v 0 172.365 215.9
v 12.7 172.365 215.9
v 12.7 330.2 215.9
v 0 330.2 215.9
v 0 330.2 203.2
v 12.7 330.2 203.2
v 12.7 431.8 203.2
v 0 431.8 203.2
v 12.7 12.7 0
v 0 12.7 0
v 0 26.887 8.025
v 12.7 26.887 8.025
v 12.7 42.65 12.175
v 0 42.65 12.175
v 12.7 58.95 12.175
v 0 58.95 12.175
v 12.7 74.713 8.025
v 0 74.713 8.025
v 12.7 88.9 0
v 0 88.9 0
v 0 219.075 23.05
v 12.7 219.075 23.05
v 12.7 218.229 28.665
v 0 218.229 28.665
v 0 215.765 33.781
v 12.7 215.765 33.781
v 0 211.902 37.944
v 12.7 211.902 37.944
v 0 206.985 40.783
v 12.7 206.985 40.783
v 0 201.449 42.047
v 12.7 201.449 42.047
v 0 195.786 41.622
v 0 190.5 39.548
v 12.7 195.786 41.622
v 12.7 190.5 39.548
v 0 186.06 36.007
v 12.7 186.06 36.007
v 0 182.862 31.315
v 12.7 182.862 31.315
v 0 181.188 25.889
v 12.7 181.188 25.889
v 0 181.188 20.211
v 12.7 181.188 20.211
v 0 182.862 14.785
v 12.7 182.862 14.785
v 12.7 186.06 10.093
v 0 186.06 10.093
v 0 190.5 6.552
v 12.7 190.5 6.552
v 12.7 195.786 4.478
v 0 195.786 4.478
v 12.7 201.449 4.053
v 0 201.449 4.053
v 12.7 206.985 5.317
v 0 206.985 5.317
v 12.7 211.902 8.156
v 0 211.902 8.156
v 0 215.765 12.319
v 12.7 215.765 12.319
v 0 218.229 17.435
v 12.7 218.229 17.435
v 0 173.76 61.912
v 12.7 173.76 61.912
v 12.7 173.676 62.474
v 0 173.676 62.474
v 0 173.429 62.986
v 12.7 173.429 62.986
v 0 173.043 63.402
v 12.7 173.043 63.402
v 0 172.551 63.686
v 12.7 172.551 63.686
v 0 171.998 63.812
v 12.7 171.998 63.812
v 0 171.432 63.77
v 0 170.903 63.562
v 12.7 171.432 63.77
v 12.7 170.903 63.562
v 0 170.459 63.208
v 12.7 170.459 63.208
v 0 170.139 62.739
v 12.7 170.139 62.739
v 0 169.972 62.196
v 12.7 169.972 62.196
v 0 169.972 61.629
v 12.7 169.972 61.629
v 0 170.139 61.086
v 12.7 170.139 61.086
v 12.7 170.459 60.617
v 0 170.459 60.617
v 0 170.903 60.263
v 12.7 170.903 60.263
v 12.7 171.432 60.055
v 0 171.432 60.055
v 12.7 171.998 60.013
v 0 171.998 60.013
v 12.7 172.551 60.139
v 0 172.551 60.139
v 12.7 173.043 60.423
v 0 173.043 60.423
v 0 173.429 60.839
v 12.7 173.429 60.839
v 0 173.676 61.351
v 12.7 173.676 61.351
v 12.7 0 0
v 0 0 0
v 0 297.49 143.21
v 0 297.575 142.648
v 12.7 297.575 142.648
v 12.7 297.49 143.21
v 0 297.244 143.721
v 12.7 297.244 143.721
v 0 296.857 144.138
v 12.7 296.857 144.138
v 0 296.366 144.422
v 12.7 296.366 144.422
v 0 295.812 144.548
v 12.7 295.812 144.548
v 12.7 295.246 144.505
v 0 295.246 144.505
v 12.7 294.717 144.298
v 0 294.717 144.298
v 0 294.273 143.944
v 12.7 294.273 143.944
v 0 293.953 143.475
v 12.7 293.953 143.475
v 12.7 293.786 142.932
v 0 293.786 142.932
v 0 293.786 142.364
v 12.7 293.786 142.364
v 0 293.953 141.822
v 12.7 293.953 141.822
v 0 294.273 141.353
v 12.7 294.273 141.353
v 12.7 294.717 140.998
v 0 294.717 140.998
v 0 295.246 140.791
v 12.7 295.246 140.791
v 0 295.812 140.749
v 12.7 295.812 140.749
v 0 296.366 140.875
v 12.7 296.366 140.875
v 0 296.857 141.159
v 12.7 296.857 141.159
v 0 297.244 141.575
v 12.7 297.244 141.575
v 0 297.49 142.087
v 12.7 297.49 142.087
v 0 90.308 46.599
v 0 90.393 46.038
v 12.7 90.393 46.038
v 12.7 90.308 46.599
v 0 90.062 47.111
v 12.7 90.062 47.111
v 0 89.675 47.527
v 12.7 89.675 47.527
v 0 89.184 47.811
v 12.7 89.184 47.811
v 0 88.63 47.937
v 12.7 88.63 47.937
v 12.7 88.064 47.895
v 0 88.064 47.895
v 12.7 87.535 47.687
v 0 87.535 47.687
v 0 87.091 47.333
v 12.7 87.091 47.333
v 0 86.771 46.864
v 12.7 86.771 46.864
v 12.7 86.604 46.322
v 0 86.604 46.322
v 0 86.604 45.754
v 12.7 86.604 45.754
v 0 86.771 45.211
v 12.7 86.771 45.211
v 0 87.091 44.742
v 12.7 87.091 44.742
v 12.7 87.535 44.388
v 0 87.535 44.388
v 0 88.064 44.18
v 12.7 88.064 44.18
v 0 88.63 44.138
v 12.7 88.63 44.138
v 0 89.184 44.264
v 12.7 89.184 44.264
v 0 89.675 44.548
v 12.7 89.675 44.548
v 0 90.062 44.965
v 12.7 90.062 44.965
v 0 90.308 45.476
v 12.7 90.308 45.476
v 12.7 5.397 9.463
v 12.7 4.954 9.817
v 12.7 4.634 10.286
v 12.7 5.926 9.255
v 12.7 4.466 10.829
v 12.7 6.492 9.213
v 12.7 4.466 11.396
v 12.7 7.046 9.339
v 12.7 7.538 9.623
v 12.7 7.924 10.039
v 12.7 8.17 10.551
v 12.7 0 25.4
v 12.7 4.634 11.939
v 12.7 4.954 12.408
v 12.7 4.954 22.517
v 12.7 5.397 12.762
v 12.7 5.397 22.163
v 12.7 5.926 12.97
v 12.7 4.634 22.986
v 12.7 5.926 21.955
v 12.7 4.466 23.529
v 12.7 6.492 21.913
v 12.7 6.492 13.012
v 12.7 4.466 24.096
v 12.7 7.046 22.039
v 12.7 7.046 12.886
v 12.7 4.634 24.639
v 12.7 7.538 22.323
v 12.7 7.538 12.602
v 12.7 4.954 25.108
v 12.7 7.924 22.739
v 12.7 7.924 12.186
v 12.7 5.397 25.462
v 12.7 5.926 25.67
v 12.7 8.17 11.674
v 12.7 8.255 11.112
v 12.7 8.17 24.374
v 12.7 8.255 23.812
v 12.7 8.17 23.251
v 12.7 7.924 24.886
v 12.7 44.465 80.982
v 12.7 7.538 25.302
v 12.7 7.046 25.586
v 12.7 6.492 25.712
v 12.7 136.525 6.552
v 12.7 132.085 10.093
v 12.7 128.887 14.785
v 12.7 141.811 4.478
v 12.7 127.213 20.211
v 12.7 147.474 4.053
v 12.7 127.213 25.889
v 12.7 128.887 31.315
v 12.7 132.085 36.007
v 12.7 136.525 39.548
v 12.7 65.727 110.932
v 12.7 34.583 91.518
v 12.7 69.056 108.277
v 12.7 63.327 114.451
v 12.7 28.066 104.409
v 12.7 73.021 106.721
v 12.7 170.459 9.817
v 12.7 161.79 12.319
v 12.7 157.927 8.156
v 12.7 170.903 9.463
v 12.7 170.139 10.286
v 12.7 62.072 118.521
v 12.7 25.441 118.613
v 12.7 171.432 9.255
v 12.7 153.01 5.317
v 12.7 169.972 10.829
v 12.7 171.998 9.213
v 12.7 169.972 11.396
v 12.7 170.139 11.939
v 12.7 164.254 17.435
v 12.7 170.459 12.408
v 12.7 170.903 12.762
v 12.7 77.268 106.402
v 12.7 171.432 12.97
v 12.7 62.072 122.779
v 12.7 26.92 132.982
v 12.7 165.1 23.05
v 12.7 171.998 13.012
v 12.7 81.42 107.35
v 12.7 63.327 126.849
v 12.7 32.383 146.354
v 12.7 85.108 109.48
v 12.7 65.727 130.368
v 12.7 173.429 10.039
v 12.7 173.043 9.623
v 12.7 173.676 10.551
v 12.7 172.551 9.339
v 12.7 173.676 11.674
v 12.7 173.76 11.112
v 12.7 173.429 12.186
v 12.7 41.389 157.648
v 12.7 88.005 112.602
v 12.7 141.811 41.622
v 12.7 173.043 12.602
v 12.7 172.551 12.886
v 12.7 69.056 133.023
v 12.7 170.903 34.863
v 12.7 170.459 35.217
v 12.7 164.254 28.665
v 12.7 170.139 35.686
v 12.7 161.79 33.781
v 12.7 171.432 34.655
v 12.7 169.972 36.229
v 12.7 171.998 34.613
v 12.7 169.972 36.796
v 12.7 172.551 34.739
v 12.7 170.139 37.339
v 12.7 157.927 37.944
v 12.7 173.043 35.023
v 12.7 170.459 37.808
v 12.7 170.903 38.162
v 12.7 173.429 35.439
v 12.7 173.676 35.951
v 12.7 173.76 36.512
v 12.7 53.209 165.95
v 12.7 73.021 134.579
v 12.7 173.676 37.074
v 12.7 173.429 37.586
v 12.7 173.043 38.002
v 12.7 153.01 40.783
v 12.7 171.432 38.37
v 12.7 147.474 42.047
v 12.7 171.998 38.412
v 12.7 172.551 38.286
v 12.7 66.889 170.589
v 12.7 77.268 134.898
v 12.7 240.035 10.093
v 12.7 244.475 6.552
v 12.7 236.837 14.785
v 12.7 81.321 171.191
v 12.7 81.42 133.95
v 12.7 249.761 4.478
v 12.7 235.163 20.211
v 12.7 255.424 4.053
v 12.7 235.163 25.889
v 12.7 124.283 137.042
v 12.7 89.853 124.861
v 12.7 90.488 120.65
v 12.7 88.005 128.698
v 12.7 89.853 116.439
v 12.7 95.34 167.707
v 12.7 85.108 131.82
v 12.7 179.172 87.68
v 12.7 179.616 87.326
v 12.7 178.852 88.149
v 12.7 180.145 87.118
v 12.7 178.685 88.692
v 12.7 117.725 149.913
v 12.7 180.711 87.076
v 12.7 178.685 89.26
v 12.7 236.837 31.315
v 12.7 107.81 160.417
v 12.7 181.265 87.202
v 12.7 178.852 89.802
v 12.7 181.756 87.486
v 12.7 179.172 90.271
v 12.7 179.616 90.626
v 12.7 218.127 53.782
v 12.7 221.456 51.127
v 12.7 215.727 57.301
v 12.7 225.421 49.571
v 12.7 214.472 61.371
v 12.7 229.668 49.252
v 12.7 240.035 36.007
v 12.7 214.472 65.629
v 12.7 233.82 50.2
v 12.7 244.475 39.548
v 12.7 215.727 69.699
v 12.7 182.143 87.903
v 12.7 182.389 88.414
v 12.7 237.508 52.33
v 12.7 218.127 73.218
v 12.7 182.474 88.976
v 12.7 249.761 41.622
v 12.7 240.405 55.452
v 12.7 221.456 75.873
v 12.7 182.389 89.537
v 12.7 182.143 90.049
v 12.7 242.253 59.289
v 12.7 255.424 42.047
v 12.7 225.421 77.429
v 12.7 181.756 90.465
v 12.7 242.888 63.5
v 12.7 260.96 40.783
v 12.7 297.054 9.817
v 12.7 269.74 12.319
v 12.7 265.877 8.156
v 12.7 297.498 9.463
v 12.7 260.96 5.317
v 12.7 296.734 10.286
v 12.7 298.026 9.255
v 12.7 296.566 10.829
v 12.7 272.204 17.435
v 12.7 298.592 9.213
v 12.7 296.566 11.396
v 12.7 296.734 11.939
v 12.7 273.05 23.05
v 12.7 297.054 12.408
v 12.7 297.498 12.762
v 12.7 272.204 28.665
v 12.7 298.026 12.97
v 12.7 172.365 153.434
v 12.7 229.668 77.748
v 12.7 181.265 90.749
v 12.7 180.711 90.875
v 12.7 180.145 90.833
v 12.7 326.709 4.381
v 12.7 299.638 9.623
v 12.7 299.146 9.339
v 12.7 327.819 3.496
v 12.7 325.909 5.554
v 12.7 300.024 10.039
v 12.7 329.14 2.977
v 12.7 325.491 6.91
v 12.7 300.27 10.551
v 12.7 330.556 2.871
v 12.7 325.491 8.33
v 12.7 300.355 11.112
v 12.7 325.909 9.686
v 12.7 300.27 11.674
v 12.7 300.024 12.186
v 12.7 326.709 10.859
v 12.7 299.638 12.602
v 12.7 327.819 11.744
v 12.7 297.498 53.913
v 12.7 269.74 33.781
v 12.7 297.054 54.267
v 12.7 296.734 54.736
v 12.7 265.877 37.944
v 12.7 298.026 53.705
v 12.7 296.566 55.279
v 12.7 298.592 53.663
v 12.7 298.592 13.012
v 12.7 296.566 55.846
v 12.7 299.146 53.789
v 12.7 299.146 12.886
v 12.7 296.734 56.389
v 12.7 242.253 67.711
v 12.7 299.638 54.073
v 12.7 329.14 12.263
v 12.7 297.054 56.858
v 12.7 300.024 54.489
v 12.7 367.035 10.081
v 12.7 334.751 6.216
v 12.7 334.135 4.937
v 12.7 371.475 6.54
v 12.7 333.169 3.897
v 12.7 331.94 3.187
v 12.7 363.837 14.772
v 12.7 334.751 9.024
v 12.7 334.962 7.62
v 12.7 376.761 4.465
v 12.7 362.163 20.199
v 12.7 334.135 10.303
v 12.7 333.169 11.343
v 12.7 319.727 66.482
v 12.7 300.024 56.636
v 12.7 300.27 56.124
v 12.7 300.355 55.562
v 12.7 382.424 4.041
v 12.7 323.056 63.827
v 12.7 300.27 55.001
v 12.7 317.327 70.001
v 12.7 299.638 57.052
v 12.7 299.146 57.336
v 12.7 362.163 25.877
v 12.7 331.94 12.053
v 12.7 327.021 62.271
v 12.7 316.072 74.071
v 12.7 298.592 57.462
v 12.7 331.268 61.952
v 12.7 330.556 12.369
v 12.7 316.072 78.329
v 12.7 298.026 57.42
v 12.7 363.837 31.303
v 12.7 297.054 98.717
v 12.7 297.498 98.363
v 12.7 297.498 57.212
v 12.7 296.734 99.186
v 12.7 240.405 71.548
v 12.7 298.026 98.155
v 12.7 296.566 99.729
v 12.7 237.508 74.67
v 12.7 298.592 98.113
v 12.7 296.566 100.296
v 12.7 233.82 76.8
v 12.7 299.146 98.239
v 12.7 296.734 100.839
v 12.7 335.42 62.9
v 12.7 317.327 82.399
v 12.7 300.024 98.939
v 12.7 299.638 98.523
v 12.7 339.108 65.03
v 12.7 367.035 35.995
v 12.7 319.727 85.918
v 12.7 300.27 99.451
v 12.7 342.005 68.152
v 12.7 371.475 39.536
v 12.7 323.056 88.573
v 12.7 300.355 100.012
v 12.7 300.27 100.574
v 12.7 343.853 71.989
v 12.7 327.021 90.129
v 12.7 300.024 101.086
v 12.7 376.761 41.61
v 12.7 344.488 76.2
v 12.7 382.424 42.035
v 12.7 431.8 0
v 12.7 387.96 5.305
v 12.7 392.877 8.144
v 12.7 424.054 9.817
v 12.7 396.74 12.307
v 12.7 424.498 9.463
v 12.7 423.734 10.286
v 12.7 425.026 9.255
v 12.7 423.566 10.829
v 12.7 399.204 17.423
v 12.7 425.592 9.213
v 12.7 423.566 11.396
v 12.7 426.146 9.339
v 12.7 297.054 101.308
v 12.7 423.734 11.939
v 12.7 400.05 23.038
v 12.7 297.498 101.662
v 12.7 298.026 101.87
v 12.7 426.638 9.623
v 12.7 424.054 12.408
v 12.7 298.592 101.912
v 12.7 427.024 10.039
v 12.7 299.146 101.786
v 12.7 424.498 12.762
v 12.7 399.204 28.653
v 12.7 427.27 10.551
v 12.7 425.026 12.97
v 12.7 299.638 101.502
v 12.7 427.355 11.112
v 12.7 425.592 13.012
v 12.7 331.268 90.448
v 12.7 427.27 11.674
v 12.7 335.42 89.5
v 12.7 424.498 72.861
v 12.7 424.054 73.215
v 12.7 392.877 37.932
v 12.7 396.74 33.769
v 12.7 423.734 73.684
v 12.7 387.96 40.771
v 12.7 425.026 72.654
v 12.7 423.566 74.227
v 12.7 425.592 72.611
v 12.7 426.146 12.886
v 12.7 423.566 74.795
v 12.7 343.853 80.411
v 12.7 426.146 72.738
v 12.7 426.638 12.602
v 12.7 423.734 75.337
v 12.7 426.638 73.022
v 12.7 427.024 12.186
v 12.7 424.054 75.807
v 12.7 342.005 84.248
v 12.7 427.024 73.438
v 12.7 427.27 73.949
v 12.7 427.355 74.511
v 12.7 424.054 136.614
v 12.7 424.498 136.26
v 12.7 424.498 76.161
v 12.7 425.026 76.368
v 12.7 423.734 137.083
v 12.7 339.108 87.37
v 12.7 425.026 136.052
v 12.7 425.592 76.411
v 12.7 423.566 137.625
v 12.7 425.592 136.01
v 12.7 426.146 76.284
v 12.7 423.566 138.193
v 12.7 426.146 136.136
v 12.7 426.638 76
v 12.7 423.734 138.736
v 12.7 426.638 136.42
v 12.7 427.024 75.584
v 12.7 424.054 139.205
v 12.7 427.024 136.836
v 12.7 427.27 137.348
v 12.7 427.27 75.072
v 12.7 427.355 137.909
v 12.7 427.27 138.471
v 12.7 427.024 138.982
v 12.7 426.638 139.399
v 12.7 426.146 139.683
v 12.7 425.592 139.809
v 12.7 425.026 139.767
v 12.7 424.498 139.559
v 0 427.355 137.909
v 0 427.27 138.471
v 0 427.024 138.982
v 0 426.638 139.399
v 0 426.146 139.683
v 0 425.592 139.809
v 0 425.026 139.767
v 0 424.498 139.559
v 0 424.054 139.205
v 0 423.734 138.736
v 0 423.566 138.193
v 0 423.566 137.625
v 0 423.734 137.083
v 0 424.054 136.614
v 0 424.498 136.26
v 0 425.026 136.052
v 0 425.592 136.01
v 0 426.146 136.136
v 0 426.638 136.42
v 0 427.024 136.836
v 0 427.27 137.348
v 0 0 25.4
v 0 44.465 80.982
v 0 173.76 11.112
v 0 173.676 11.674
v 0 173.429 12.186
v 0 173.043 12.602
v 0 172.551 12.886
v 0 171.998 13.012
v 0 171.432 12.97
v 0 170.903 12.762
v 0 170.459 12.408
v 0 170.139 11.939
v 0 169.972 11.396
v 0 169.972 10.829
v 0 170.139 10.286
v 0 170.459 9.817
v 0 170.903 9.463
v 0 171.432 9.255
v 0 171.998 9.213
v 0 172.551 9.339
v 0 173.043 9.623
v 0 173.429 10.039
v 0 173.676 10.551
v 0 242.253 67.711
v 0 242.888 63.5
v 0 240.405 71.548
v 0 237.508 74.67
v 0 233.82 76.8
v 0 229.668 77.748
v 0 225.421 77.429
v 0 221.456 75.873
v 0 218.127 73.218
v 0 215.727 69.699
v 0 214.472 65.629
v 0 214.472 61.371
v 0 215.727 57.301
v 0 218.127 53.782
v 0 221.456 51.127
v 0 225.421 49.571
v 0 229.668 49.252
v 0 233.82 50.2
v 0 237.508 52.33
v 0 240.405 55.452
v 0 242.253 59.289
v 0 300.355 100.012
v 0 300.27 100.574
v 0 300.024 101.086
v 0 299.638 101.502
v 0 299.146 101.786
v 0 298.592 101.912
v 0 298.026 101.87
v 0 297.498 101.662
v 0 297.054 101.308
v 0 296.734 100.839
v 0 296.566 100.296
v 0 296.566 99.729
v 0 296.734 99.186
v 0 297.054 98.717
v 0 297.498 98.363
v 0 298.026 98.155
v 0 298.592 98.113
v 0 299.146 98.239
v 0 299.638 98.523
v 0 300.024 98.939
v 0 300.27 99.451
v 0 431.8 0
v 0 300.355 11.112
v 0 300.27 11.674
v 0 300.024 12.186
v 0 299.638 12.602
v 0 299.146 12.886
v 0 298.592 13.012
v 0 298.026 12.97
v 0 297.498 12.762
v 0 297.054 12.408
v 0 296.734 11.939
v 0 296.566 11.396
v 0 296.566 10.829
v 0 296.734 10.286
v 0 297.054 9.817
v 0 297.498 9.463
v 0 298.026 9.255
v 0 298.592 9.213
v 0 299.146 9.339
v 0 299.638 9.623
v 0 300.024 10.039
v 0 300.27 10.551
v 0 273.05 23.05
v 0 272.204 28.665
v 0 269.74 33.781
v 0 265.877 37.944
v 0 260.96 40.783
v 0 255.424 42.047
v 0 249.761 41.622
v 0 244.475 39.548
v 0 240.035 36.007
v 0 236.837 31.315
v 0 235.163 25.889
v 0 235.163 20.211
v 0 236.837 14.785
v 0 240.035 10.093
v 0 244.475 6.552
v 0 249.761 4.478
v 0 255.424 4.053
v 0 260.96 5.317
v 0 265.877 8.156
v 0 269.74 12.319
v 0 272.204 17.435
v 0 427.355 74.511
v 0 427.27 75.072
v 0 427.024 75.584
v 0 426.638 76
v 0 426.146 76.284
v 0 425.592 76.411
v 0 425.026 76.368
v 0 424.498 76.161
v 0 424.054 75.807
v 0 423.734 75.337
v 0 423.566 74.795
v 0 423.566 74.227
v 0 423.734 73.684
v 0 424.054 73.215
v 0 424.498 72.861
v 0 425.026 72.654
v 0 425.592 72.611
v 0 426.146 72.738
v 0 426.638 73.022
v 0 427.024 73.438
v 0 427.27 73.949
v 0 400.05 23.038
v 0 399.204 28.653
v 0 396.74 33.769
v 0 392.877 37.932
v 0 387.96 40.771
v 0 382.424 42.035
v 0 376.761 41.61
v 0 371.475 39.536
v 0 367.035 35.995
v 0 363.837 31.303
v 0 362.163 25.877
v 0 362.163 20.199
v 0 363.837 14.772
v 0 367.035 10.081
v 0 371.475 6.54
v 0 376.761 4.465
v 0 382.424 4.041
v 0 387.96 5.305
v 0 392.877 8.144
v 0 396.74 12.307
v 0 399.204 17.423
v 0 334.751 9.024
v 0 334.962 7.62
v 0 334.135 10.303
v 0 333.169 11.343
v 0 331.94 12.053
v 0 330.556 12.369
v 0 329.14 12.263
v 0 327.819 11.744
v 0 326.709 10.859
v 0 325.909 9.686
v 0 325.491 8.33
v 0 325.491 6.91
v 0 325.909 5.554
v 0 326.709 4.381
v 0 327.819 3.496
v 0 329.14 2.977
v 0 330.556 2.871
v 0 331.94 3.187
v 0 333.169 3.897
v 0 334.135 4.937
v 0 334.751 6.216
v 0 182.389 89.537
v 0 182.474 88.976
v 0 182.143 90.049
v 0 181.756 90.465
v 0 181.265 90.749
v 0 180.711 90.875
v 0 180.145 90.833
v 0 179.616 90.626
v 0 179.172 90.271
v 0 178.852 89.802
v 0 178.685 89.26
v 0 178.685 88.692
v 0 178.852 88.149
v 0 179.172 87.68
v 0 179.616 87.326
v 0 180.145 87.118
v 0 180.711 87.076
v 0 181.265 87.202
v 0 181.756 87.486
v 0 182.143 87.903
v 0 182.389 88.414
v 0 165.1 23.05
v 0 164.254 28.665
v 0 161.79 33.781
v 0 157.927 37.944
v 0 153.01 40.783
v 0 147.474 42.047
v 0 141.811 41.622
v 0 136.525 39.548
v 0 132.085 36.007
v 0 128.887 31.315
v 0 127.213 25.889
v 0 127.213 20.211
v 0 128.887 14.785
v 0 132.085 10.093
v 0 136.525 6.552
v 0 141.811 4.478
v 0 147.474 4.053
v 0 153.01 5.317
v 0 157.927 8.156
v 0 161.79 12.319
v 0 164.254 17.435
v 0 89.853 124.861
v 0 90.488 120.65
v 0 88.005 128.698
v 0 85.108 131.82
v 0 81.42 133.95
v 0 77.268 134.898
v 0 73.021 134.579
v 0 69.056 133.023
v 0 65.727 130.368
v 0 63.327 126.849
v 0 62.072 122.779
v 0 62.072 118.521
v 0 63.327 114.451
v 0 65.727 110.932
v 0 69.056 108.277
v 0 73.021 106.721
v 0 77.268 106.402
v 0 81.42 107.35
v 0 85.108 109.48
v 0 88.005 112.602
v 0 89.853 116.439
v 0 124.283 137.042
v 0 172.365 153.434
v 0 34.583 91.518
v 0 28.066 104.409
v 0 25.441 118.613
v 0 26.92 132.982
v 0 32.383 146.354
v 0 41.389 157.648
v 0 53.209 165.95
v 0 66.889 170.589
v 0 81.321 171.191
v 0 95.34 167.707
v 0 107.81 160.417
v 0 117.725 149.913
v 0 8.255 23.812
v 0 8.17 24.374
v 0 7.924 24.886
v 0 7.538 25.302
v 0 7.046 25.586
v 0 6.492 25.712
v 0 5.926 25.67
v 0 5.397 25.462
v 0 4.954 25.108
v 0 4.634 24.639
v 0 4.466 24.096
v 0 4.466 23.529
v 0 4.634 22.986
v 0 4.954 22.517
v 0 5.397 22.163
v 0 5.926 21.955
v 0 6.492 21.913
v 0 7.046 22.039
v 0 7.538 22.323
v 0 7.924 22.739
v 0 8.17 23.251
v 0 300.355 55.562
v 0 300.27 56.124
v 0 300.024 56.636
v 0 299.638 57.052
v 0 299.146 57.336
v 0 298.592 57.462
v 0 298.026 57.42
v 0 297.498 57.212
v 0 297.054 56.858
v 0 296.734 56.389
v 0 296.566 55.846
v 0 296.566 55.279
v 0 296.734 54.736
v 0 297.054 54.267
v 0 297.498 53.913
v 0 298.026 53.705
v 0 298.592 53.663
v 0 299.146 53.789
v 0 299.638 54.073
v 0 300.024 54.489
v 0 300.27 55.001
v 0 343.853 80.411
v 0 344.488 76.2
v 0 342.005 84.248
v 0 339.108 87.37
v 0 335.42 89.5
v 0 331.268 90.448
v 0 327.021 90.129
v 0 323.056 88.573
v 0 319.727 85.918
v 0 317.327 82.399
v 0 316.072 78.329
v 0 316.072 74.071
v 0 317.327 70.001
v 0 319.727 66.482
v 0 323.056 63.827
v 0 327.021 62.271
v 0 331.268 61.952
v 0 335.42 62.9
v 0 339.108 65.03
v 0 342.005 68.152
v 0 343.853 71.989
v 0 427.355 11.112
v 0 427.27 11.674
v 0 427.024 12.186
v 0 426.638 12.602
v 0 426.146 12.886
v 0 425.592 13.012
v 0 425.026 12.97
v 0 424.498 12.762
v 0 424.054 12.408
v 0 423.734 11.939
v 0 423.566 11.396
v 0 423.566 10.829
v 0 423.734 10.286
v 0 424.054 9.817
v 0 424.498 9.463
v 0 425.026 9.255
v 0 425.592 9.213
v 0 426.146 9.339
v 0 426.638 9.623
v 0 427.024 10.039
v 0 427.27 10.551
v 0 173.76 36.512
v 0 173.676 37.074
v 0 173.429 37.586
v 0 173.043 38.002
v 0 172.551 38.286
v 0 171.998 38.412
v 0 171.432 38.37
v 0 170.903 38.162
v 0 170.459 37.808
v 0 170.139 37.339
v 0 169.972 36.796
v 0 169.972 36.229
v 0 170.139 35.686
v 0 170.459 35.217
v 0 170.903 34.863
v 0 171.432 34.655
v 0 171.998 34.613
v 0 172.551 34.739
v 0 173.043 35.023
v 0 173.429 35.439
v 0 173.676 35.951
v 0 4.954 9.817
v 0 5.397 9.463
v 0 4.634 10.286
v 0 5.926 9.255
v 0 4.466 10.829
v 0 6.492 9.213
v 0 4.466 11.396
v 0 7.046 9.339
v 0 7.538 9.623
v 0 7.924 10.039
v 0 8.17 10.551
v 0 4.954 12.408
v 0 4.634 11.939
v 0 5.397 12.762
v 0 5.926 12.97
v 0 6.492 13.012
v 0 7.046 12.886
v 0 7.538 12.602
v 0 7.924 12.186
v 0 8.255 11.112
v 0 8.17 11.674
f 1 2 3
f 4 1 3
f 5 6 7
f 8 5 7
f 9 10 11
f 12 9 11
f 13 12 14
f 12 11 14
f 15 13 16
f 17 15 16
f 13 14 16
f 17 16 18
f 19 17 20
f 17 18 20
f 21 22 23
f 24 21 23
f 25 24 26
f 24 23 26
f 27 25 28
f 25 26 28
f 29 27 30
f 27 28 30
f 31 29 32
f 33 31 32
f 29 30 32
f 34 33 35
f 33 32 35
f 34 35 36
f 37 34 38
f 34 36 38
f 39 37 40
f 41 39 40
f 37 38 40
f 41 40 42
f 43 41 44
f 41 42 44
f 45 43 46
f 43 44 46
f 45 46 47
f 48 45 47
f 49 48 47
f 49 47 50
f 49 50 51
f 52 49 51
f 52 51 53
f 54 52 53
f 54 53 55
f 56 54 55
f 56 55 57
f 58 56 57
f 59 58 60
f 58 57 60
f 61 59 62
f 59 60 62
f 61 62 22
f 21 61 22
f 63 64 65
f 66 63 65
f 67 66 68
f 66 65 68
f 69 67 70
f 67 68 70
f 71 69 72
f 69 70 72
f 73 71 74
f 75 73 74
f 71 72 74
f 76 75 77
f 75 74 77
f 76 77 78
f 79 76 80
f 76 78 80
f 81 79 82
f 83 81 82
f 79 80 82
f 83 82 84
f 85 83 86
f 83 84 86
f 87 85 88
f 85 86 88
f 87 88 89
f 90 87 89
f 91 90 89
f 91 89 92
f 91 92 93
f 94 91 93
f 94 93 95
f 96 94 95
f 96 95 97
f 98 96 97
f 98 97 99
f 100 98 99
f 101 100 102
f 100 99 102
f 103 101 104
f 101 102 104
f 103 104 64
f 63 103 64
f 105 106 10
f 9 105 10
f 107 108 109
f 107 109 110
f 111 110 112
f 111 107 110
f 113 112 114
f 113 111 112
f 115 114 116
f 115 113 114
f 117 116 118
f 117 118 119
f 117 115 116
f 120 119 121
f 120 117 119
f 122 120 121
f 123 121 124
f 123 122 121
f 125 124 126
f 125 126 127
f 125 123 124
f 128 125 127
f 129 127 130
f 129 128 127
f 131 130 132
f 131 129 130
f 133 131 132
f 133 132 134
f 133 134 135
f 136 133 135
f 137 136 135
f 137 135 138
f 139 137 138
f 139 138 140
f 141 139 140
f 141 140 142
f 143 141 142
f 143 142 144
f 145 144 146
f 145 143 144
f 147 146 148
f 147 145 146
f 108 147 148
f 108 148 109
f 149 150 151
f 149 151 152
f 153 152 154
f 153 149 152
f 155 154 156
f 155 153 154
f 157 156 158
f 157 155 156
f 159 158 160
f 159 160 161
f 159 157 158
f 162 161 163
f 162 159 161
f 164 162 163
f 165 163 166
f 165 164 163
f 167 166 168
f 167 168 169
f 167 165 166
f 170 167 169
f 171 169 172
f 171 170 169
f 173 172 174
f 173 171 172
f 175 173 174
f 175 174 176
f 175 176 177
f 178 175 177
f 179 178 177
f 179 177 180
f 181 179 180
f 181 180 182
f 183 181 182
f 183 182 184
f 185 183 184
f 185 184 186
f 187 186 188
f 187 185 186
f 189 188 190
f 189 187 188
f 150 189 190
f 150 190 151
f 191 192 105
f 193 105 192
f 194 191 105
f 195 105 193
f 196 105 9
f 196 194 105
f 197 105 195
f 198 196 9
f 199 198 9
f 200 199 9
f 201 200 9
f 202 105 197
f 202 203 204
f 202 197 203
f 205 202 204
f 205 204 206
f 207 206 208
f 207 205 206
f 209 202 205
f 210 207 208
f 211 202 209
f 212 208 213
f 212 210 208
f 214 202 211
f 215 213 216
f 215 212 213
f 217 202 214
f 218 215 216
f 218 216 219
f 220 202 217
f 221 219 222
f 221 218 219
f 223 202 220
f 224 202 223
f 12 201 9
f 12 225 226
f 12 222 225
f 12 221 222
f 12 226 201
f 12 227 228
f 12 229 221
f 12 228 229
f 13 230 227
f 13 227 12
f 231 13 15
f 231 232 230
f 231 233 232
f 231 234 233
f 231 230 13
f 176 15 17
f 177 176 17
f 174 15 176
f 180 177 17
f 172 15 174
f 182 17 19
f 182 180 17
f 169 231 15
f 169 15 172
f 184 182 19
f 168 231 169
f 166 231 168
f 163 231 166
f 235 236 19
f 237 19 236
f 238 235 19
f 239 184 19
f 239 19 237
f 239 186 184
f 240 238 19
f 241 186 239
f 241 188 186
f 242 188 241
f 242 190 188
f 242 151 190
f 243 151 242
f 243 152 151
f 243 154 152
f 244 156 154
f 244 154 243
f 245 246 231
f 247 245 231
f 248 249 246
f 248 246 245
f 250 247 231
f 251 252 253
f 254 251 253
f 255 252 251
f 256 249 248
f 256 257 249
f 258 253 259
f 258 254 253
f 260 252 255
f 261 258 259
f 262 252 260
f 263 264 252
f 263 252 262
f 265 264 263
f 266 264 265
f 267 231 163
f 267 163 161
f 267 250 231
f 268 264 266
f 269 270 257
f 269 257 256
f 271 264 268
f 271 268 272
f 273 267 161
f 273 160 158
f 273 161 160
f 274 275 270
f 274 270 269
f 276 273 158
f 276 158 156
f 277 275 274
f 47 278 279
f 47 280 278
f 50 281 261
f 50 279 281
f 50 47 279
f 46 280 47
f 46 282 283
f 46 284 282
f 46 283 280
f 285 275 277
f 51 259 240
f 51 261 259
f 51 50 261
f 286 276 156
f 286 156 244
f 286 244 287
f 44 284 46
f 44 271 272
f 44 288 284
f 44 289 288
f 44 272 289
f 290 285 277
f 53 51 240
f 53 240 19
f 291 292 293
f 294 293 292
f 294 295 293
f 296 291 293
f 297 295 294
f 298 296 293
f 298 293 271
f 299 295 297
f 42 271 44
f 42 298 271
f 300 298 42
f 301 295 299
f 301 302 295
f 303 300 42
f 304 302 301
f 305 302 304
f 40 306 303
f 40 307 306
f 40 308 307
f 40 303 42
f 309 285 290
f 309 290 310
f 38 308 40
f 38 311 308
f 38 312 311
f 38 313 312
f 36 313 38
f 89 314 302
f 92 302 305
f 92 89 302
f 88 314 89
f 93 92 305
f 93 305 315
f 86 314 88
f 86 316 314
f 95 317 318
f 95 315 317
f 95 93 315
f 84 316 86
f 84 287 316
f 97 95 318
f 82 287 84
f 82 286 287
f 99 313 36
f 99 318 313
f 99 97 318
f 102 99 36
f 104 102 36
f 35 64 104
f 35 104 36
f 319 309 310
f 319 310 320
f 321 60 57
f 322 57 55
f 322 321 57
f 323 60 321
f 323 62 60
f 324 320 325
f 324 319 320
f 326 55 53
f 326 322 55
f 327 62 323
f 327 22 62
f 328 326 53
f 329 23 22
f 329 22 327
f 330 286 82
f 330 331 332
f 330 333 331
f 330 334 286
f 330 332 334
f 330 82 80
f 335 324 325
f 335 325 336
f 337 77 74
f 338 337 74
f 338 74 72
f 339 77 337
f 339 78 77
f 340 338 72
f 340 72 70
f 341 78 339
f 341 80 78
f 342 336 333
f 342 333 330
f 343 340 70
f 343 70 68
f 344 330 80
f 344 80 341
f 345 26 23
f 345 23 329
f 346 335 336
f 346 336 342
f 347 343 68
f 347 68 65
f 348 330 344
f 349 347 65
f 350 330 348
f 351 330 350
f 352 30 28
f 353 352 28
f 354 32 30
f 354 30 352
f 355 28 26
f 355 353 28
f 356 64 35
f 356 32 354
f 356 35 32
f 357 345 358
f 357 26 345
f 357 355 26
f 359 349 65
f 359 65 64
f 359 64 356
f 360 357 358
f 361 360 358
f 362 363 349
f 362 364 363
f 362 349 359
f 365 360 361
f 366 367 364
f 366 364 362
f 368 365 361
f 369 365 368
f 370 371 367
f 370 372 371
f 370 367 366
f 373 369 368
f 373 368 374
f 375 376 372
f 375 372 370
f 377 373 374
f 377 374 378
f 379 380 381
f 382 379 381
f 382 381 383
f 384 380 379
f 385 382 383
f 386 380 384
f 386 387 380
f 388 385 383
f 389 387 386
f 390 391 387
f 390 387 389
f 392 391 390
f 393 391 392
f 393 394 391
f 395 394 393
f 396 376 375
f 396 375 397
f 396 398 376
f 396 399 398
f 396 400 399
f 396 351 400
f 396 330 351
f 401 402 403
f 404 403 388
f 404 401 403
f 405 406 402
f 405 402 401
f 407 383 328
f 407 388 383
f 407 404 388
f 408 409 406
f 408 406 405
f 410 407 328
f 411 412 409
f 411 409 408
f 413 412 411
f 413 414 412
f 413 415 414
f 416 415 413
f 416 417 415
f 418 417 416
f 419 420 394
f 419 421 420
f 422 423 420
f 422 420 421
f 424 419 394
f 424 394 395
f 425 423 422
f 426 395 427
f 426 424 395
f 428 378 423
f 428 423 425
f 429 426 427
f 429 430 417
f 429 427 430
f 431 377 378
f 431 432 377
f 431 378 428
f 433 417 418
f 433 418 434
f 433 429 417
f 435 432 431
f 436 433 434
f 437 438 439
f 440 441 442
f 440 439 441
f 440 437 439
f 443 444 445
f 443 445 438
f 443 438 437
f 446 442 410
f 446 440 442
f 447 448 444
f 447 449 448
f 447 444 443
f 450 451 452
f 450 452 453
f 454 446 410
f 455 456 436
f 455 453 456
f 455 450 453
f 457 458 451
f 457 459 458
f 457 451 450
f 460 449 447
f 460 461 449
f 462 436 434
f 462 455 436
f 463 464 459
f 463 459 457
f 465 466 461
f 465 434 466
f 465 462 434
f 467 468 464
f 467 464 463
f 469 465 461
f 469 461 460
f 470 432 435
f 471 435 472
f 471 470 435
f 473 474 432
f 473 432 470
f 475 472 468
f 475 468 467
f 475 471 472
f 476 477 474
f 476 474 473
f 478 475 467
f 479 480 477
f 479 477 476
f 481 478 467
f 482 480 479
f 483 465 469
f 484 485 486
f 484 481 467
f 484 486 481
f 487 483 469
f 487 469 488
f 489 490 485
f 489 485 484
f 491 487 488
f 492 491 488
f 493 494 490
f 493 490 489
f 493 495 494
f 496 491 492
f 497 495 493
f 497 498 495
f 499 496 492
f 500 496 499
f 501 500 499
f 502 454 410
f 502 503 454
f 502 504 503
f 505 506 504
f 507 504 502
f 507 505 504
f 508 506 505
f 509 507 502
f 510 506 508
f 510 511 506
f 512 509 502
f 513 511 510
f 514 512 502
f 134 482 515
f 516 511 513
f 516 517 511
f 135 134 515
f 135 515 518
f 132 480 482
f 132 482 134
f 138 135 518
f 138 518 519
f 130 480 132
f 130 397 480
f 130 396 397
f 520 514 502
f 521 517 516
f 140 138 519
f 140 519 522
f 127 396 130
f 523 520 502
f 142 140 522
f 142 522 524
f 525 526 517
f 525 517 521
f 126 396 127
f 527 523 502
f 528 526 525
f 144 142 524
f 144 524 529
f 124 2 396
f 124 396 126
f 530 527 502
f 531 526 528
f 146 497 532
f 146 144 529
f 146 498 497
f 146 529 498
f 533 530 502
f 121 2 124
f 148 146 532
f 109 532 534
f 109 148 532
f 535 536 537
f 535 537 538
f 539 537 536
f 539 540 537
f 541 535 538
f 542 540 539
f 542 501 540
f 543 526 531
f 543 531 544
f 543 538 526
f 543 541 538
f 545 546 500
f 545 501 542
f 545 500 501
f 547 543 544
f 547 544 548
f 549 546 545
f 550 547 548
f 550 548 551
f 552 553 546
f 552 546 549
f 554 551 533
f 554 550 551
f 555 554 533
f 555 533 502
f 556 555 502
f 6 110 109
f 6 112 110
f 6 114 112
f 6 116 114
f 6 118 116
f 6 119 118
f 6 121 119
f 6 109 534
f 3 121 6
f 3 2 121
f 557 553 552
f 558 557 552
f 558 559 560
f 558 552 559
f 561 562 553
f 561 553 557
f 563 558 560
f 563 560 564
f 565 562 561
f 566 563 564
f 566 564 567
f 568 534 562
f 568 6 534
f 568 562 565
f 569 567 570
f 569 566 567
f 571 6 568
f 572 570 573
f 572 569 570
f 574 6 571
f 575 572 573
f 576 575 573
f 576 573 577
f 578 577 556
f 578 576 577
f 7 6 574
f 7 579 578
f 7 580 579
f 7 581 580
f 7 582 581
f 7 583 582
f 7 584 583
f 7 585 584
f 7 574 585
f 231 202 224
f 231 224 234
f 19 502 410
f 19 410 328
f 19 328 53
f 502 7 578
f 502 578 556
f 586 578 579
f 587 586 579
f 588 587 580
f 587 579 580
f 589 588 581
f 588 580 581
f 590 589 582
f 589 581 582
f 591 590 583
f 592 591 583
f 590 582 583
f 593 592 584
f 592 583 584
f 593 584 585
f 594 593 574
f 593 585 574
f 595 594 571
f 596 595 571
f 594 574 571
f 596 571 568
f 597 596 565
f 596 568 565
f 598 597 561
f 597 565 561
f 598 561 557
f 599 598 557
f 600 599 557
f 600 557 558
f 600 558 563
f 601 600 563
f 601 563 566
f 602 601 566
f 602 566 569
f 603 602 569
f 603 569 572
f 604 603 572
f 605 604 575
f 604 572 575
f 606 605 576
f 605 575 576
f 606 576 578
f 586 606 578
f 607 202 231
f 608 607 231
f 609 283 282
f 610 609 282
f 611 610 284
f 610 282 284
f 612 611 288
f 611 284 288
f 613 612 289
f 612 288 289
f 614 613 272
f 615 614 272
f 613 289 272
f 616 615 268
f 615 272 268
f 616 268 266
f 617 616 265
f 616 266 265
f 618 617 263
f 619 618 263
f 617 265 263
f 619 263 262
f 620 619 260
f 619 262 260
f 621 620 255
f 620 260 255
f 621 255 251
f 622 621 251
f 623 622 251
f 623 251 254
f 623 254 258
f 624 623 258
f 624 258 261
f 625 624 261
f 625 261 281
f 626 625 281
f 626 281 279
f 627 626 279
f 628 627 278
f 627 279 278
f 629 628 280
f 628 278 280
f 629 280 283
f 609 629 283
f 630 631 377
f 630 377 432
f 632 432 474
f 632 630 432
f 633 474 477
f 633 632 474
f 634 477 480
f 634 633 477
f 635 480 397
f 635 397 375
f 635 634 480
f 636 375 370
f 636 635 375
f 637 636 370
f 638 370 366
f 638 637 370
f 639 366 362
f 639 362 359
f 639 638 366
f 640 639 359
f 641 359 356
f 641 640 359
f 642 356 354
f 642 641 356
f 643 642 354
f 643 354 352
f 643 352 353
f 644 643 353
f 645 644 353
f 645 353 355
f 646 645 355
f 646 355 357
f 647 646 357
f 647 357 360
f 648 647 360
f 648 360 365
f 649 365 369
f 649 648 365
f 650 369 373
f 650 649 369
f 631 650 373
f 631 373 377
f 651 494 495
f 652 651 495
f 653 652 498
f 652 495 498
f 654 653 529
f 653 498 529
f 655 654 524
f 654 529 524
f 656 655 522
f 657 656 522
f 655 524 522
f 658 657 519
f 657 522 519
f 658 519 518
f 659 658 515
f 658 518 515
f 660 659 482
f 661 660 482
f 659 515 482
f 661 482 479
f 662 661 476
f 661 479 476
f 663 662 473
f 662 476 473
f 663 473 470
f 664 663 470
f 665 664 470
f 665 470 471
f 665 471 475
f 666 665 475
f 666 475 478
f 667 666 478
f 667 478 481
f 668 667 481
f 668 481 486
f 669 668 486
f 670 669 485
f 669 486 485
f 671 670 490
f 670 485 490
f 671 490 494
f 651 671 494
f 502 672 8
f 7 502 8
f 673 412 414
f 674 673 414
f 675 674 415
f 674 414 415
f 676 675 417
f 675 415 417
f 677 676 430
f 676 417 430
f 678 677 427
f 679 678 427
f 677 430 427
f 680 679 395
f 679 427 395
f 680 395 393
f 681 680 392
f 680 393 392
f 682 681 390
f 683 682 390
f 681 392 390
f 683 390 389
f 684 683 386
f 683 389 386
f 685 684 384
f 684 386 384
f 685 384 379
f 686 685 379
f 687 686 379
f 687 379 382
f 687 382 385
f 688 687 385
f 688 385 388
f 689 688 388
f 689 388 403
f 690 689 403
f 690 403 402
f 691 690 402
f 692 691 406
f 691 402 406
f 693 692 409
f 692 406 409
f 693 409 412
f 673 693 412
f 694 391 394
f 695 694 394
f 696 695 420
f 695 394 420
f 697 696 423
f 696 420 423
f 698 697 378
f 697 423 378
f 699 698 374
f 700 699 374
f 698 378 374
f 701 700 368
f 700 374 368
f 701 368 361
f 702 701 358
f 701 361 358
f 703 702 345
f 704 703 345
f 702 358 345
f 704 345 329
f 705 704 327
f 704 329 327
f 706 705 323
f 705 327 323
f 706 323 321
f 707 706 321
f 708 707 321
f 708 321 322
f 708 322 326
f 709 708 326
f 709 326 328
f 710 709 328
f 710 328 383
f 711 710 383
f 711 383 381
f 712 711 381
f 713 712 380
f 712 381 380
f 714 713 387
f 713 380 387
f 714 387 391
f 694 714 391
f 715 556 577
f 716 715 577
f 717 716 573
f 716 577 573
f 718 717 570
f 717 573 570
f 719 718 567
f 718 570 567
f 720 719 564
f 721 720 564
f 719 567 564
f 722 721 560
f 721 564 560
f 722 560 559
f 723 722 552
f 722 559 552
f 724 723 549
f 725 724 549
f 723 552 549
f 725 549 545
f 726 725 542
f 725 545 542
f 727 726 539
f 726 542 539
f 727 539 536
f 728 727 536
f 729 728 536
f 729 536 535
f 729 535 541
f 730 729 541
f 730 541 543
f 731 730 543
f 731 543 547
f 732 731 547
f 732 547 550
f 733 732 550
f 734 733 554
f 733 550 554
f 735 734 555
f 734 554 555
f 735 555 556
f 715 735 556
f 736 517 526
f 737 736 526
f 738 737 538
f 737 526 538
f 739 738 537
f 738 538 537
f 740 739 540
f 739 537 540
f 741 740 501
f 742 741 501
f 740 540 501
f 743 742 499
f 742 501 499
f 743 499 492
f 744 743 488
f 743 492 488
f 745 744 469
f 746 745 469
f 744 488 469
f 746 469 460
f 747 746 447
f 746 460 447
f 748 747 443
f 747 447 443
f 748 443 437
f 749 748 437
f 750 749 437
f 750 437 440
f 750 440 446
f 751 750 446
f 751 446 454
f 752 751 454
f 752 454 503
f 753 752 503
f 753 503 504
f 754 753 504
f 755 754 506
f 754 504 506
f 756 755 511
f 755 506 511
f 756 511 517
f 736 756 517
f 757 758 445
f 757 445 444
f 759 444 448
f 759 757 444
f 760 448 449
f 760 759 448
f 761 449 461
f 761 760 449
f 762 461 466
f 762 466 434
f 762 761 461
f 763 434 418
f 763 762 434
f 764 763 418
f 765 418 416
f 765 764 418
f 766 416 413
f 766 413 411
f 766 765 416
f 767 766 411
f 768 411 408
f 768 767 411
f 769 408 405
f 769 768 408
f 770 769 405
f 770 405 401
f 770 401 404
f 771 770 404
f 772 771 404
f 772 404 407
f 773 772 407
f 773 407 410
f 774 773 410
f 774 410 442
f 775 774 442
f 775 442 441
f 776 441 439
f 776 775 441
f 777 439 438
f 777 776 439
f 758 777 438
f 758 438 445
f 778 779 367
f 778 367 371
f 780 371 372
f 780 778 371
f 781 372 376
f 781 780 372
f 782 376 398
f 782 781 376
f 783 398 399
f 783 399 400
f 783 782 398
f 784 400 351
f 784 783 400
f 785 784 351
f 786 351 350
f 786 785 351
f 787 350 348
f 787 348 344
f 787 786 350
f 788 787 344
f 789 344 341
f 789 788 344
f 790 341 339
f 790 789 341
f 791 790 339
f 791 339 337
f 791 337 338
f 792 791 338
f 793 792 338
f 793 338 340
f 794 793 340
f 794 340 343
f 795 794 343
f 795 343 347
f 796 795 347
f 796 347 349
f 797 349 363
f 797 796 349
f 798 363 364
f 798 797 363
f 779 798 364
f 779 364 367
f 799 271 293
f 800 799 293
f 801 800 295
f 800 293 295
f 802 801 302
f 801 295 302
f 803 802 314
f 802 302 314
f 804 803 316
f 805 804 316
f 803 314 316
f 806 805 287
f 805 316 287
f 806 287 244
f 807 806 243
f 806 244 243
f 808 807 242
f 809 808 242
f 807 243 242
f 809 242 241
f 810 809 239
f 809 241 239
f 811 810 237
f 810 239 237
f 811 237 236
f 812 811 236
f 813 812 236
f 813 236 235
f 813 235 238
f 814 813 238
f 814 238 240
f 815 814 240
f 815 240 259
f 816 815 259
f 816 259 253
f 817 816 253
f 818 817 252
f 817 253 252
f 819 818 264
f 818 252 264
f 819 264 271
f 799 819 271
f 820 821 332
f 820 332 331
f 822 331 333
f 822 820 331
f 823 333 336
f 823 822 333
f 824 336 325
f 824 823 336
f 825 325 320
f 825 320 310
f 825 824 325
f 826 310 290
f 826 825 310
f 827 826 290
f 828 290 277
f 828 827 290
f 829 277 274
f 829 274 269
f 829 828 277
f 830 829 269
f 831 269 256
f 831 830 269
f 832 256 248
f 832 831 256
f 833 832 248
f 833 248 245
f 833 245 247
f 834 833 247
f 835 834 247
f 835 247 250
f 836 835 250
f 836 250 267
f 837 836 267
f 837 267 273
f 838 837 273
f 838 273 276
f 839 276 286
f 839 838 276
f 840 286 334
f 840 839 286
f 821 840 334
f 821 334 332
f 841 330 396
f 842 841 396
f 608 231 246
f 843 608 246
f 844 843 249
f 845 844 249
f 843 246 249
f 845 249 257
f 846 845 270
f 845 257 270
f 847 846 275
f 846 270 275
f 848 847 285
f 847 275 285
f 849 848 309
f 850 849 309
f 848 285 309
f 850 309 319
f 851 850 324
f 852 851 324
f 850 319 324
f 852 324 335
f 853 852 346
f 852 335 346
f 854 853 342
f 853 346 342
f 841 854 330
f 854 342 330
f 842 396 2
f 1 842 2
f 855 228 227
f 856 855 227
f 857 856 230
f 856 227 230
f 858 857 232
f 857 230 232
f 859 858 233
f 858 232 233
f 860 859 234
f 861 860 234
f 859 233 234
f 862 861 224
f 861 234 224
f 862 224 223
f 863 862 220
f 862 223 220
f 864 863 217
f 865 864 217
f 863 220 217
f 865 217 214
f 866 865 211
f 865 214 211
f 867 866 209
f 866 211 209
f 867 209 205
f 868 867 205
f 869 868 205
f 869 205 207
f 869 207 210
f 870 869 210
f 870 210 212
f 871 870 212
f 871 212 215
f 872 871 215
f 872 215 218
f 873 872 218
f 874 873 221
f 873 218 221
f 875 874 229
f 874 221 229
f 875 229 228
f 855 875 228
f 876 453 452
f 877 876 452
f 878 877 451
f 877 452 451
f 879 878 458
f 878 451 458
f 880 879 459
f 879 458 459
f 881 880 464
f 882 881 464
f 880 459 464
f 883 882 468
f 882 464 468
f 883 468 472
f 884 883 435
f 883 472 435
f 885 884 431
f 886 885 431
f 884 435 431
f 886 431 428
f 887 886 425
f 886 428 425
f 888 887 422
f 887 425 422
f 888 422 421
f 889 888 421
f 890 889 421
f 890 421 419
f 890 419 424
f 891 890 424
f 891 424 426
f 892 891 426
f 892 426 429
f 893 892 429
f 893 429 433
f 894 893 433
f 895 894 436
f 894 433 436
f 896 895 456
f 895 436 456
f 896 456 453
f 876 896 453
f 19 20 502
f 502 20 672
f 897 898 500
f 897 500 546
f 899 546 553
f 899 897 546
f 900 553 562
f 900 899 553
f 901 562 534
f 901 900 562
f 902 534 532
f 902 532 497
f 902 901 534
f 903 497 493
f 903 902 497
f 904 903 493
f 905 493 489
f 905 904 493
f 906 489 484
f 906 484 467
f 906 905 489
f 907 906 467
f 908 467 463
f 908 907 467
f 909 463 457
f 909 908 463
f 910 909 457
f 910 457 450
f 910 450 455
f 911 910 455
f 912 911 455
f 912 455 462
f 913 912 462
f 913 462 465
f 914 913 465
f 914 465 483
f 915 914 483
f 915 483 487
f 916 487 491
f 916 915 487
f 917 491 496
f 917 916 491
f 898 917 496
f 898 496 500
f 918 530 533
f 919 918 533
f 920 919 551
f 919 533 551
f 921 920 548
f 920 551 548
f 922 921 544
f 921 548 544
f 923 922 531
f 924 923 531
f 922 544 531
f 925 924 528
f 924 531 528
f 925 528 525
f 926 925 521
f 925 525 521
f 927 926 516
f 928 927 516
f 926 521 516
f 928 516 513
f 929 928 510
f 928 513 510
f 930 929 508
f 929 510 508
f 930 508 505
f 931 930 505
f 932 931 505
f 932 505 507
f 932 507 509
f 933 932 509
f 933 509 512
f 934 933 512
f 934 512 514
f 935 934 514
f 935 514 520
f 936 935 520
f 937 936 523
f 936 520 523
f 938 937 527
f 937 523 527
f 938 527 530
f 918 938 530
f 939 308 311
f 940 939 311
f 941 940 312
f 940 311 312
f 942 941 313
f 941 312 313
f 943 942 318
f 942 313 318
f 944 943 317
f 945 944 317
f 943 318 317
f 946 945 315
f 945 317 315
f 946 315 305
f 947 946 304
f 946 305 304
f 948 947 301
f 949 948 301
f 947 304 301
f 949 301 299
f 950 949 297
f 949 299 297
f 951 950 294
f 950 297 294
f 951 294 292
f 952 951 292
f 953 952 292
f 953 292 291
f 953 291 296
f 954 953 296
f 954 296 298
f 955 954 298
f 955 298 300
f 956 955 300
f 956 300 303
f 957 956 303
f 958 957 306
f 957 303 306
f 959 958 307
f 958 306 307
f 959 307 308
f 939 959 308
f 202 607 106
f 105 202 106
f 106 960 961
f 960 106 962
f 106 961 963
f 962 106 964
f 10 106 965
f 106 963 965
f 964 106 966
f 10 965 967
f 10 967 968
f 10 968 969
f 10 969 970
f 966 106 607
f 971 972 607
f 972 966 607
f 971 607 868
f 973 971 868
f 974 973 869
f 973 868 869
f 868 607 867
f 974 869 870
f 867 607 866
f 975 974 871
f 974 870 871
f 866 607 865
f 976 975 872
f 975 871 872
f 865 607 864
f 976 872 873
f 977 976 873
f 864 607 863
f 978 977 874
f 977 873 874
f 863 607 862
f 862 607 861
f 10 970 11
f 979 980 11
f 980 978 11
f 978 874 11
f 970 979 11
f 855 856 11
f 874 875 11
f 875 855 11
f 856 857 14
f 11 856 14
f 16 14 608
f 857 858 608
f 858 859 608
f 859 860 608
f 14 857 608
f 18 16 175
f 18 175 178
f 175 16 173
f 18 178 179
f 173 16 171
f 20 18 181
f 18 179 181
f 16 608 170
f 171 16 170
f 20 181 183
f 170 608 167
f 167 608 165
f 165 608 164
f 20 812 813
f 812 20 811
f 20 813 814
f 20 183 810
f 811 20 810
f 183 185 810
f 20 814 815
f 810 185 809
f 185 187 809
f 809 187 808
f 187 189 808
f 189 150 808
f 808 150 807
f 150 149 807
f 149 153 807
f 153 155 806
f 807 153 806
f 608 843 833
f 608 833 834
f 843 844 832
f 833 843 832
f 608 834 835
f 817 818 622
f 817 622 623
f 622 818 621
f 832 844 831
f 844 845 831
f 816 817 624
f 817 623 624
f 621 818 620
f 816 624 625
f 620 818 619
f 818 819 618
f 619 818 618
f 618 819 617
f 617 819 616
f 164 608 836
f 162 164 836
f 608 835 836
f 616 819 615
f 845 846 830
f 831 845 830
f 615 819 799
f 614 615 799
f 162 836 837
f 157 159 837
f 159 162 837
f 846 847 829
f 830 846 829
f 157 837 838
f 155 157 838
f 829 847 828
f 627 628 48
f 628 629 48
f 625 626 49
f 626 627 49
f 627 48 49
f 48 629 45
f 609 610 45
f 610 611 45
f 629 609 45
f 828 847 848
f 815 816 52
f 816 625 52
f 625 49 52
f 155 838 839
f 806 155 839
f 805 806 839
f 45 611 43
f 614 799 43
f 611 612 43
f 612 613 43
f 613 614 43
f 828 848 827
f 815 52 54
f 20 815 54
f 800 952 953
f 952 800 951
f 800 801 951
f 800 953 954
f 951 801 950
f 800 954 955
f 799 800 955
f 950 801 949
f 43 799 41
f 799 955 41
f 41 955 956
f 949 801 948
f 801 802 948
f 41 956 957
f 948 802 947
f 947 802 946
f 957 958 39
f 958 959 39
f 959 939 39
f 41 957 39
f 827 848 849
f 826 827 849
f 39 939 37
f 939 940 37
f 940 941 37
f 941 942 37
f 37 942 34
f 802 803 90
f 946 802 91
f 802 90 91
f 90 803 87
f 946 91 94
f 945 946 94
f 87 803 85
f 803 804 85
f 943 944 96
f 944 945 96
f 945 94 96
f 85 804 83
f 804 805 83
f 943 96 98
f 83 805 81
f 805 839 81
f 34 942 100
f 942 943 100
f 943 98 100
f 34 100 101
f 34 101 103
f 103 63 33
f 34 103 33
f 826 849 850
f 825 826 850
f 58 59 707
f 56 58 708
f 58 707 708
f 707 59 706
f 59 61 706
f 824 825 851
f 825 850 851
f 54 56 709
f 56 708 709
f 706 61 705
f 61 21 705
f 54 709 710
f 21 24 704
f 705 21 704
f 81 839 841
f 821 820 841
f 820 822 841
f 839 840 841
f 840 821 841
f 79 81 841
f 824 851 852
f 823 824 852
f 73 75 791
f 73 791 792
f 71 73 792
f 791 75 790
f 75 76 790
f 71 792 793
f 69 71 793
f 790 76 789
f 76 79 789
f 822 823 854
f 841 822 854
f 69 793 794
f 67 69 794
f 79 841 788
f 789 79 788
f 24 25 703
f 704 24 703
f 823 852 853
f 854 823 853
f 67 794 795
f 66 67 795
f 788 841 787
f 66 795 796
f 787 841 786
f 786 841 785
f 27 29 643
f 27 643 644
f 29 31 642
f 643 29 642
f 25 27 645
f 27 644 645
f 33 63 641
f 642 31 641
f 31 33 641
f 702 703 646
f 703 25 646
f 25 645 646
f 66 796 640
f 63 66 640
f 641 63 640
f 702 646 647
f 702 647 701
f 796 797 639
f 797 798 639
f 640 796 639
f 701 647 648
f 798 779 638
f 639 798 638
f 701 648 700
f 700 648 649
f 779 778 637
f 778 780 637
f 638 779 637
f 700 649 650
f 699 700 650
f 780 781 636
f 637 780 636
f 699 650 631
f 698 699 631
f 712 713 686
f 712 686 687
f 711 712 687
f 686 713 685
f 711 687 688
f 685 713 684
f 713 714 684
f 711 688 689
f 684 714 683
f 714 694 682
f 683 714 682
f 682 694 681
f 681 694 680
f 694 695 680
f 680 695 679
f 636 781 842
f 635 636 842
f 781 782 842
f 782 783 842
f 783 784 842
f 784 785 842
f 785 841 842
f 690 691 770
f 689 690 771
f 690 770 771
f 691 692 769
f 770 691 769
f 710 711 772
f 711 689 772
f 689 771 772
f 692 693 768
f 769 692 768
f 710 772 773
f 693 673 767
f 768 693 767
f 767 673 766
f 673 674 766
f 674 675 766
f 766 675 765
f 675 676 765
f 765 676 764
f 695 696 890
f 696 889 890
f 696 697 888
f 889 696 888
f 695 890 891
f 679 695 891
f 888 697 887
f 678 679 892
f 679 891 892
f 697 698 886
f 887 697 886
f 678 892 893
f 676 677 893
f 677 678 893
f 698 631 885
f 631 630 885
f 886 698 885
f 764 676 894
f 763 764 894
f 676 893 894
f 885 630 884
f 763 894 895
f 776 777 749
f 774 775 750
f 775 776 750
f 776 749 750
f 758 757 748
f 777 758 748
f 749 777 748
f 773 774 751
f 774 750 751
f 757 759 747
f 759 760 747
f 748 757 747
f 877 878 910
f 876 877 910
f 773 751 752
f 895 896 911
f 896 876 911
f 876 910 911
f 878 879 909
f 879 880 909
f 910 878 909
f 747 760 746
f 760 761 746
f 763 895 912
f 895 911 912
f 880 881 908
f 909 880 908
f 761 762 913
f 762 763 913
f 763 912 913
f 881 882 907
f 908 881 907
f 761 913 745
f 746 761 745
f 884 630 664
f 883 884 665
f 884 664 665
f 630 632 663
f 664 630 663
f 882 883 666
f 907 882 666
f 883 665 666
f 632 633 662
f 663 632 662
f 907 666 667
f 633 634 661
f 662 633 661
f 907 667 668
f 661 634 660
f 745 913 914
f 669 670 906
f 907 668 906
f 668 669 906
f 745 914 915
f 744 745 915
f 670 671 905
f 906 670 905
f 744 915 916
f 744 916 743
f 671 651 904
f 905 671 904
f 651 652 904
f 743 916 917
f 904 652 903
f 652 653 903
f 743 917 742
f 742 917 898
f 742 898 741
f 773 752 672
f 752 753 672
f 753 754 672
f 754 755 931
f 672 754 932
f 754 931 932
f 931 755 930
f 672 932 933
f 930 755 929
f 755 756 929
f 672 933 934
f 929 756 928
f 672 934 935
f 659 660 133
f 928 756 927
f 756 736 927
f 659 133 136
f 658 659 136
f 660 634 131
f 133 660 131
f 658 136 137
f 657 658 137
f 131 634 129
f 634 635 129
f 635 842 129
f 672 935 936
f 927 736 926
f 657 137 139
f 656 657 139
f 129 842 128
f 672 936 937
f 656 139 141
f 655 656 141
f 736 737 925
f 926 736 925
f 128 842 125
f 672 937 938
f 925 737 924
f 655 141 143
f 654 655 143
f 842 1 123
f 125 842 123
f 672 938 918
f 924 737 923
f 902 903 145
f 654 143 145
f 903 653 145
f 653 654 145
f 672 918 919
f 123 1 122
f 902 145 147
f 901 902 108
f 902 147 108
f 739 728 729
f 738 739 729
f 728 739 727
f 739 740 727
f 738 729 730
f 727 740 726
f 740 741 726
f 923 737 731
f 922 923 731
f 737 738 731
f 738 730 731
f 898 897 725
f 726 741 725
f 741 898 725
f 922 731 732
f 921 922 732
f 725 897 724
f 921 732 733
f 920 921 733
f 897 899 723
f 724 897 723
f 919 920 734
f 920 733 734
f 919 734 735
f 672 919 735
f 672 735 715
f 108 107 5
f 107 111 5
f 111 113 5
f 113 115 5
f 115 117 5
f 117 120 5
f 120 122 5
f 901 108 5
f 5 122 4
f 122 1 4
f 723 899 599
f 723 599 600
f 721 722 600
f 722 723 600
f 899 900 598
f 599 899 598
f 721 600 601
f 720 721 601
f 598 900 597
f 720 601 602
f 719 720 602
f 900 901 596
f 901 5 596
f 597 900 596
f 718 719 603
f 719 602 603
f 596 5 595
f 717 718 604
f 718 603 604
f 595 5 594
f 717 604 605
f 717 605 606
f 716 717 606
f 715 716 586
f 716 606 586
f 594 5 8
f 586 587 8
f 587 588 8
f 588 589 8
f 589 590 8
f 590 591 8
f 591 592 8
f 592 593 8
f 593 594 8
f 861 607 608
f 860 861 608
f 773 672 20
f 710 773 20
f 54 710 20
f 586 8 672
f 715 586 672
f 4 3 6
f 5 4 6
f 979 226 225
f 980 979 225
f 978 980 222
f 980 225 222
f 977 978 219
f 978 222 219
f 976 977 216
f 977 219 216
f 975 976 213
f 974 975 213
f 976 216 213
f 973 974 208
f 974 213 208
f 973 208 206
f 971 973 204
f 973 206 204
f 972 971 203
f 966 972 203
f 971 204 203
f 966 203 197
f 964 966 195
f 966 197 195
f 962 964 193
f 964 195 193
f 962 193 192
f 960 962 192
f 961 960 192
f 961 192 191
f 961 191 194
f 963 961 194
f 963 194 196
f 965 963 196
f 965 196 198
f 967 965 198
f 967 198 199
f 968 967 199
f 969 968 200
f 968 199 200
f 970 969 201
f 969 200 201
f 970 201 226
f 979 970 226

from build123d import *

# Parameters (mm, degrees)
F0_R     = 1.905
F0_R_2   = 14.2875
F0_R_3   = 4.7625
F1_DEPTH = 12.7
F2_R     = 19.05
F3_DEPTH = 12.7
F5_DEPTH = 12.7
F6_R     = 1.905
F7_DEPTH = 12.7


with BuildPart() as f1:
    # F0 (on Right) → F1 (new body)
    with BuildSketch(Plane.YZ):
        with BuildLine():
            Line((0, 355.6), (0, 0))
            Line((0, 0), (12.7, 0))
            ThreePointArc((12.7, 0), (50.8, 12.7), (88.9, 0))
            Line((88.9, 0), (431.8, 0))
            Line((431.8, 0), (431.8, 355.6))
            Line((431.8, 355.6), (0, 355.6))
        make_face()
        with Locations((88.4877131973, 46.0377095938)):
            Circle(F0_R, mode=Mode.SUBTRACT)
        with Locations((180.5685843602, 88.9757249866)):
            Circle(F0_R, mode=Mode.SUBTRACT)
        with Locations((228.6, 63.5)):
            Circle(F0_R_2, mode=Mode.SUBTRACT)
        with Locations((330.2, 7.62)):
            Circle(F0_R_3, mode=Mode.SUBTRACT)
        with Locations((330.2, 76.2)):
            Circle(F0_R_2, mode=Mode.SUBTRACT)
        with Locations((76.2, 120.65)):
            Circle(F0_R_2, mode=Mode.SUBTRACT)
        with Locations((295.6696733139, 142.6482442277)):
            Circle(F0_R, mode=Mode.SUBTRACT)
    extrude(amount=F1_DEPTH)

    # F2 (on face) → F3 (cut, through all)
    with BuildSketch(Plane.YZ.offset(12.7)):
        with Locations((146.05, 23.05)):
            Circle(F2_R)
        with Locations((254, 23.05)):
            Circle(F2_R)
        with Locations((381, 23.0378)):
            Circle(F2_R)
        with Locations((200.025, 23.05)):
            Circle(F2_R)
    extrude(amount=-F3_DEPTH, mode=Mode.SUBTRACT)

    # F4 (on face) → F5 (cut, through all)
    with BuildSketch(Plane.YZ.offset(12.7)):
        Polygon((431.8, 355.6), (0, 355.6), (0, 215.9), (172.3654351189, 215.9), (330.2, 215.9), (355.6, 215.9), (431.8, 215.9), align=None)
        with BuildLine():
            Line((172.3654351189, 215.9), (0, 215.9))
            Line((0, 215.9), (0, 25.4))
            Line((0, 25.4), (44.4654915842, 80.9818644803))
            ThreePointArc((44.4654915842, 80.9818644803), (47.0024645882, 162.2209505049), (124.2827175595, 137.0418355316))
            Line((124.2827175595, 137.0418355316), (172.3654351189, 153.4336710633))
            Line((172.3654351189, 153.4336710633), (172.3654351189, 215.9))
        make_face()
        Polygon((431.8, 203.2), (431.8, 215.9), (355.6, 215.9), (330.2, 207.2409090909), (330.2, 203.2), align=None)
        Polygon((330.2, 207.2409090909), (355.6, 215.9), (330.2, 215.9), align=None)
    extrude(amount=-F5_DEPTH, mode=Mode.SUBTRACT)

    # F6 (on face) → F7 (cut, through all)
    with BuildSketch(Plane.YZ.offset(12.7)):
        with Locations((425.45, 11.1125)):
            Circle(F6_R)
        with Locations((425.45, 74.5109)):
            Circle(F6_R)
        with Locations((425.45, 137.9093)):
            Circle(F6_R)
        with Locations((298.45, 11.1125)):
            Circle(F6_R)
        with Locations((298.45, 100.0125)):
            Circle(F6_R)
        with Locations((298.45, 55.5625)):
            Circle(F6_R)
        with Locations((171.8554794788, 11.1125)):
            Circle(F6_R)
        with Locations((171.8554794788, 36.5125)):
            Circle(F6_R)
        with Locations((171.8554794788, 61.9125)):
            Circle(F6_R)
        with Locations((6.35, 11.1125)):
            Circle(F6_R)
        with Locations((6.35, 23.8125)):
            Circle(F6_R)
    extrude(amount=-F7_DEPTH, mode=Mode.SUBTRACT)


solid = f1.part
